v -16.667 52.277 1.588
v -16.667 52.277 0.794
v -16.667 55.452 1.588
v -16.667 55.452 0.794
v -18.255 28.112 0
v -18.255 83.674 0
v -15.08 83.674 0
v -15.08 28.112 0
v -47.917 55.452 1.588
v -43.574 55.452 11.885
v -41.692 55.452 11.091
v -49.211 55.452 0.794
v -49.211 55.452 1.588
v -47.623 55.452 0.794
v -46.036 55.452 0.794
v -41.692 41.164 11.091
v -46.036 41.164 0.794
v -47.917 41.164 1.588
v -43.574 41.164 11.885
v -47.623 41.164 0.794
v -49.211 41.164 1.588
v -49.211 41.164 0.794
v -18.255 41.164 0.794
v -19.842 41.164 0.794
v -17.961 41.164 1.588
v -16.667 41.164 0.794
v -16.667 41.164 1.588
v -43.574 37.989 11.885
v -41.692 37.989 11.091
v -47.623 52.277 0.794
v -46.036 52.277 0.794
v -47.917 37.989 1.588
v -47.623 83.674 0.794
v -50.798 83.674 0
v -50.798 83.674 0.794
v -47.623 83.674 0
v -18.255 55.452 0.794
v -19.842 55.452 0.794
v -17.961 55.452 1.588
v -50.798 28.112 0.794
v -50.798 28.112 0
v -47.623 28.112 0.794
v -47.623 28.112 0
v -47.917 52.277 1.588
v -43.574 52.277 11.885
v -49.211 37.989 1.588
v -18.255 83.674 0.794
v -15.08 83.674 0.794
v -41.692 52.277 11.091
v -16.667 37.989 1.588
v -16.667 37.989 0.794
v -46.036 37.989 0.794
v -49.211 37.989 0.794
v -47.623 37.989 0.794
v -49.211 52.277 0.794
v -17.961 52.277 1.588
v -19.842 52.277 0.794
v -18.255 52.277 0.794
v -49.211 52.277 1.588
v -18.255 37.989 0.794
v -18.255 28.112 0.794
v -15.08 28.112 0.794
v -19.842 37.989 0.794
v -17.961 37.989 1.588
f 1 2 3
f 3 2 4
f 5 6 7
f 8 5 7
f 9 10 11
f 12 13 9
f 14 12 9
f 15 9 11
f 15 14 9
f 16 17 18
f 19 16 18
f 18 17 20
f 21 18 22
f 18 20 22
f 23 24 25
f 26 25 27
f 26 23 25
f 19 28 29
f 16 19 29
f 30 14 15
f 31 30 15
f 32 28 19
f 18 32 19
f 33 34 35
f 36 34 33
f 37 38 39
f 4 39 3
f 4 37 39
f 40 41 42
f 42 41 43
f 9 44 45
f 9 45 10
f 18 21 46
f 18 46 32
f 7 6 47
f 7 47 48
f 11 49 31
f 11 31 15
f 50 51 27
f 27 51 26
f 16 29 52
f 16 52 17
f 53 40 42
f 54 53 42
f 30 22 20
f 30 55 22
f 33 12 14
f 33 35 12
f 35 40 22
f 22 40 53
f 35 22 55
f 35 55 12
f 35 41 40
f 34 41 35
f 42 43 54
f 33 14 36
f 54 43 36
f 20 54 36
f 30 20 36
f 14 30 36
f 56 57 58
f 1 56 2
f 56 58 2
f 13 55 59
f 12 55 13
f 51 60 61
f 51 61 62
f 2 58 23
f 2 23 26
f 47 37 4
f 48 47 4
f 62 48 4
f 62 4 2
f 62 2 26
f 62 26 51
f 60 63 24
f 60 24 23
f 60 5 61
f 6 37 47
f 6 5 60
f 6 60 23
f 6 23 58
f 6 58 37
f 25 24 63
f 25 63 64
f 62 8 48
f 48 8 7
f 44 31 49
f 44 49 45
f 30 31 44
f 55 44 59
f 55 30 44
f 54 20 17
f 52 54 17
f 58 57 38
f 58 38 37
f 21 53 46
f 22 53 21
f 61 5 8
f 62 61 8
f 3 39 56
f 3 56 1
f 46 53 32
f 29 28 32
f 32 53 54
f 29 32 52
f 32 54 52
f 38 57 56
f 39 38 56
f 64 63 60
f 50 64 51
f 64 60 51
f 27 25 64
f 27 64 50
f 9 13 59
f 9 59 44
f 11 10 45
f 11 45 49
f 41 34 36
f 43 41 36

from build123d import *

# Parameters (mm, degrees)
F0_W     = 3.175
F0_H     = 55.5625
F1_DEPTH = 0.79375
F2_W     = 1.5875
F2_H     = 3.175
F3_DEPTH = 0.79375
F2_W_2   = 3.175
F5_DEPTH = 25.4
F7_DEPTH = 25.4
F8_DEPTH = 11.176


with BuildPart() as f1:
    # F0 (on Top) → F1 (new body)
    with BuildSketch(Plane.XY):
        with Locations((-16.6671186362, 55.8928695858)):
            Rectangle(F0_W, F0_H)
    extrude(amount=F1_DEPTH)

    # F2 (on face) → F3, piece 2 (join)
    with BuildSketch(Plane.XY.offset(0.79375)):
        with Locations((-18.2546186362, 53.8643973635)):
            Rectangle(F2_W_2, F2_H)
        with Locations((-18.2546186362, 39.5768973635)):
            Rectangle(F2_W_2, F2_H)
    extrude(amount=F3_DEPTH)

    # F6 (on face) → F7 (cut)
    with BuildSketch(Plane.XZ.offset(-37.9893973635)):
        Polygon((-19.8421186362, 1.5875), (-19.8421186362, 0.79375), (-17.9605293072, 1.5875), align=None)
    extrude(amount=-F7_DEPTH, mode=Mode.SUBTRACT)


with BuildPart() as f1b:
    # F0 (on Top) → F1, piece 2 (new body)
    with BuildSketch(Plane.XY):
        with Locations((-49.2108686362, 55.8928695858)):
            Rectangle(F0_W, F0_H)
    extrude(amount=F1_DEPTH)

    # F2 (on face) → F3 (join)
    with BuildSketch(Plane.XY.offset(0.79375)):
        with Locations((-48.4171186362, 53.8643973635)):
            Rectangle(F2_W, F2_H)
        with Locations((-46.8296186362, 53.8643973635)):
            Rectangle(F2_W, F2_H)
        with Locations((-48.4171186362, 39.5768973635)):
            Rectangle(F2_W, F2_H)
        with Locations((-46.8296186362, 39.5768973635)):
            Rectangle(F2_W, F2_H)
    extrude(amount=F3_DEPTH)

    # F4 (on face) → F5 (cut)
    with BuildSketch(Plane.XZ.offset(-37.9893973635)):
        Polygon((-47.9174579653, 1.5875), (-46.0358686362, 0.79375), (-46.0358686362, 1.5875), align=None)
    extrude(amount=-F5_DEPTH, mode=Mode.SUBTRACT)

    # F8 (add): faces of the model
    f8_faces = [f1b.faces().sort_by_distance(p)[0] for p in [
        (-46.9766633008, 53.8643973635, 1.190625),
        (-46.9766633008, 39.5768973635, 1.190625),
    ]]
    extrude(f8_faces, amount=F8_DEPTH)


solid = Compound([f1.part, f1b.part])
